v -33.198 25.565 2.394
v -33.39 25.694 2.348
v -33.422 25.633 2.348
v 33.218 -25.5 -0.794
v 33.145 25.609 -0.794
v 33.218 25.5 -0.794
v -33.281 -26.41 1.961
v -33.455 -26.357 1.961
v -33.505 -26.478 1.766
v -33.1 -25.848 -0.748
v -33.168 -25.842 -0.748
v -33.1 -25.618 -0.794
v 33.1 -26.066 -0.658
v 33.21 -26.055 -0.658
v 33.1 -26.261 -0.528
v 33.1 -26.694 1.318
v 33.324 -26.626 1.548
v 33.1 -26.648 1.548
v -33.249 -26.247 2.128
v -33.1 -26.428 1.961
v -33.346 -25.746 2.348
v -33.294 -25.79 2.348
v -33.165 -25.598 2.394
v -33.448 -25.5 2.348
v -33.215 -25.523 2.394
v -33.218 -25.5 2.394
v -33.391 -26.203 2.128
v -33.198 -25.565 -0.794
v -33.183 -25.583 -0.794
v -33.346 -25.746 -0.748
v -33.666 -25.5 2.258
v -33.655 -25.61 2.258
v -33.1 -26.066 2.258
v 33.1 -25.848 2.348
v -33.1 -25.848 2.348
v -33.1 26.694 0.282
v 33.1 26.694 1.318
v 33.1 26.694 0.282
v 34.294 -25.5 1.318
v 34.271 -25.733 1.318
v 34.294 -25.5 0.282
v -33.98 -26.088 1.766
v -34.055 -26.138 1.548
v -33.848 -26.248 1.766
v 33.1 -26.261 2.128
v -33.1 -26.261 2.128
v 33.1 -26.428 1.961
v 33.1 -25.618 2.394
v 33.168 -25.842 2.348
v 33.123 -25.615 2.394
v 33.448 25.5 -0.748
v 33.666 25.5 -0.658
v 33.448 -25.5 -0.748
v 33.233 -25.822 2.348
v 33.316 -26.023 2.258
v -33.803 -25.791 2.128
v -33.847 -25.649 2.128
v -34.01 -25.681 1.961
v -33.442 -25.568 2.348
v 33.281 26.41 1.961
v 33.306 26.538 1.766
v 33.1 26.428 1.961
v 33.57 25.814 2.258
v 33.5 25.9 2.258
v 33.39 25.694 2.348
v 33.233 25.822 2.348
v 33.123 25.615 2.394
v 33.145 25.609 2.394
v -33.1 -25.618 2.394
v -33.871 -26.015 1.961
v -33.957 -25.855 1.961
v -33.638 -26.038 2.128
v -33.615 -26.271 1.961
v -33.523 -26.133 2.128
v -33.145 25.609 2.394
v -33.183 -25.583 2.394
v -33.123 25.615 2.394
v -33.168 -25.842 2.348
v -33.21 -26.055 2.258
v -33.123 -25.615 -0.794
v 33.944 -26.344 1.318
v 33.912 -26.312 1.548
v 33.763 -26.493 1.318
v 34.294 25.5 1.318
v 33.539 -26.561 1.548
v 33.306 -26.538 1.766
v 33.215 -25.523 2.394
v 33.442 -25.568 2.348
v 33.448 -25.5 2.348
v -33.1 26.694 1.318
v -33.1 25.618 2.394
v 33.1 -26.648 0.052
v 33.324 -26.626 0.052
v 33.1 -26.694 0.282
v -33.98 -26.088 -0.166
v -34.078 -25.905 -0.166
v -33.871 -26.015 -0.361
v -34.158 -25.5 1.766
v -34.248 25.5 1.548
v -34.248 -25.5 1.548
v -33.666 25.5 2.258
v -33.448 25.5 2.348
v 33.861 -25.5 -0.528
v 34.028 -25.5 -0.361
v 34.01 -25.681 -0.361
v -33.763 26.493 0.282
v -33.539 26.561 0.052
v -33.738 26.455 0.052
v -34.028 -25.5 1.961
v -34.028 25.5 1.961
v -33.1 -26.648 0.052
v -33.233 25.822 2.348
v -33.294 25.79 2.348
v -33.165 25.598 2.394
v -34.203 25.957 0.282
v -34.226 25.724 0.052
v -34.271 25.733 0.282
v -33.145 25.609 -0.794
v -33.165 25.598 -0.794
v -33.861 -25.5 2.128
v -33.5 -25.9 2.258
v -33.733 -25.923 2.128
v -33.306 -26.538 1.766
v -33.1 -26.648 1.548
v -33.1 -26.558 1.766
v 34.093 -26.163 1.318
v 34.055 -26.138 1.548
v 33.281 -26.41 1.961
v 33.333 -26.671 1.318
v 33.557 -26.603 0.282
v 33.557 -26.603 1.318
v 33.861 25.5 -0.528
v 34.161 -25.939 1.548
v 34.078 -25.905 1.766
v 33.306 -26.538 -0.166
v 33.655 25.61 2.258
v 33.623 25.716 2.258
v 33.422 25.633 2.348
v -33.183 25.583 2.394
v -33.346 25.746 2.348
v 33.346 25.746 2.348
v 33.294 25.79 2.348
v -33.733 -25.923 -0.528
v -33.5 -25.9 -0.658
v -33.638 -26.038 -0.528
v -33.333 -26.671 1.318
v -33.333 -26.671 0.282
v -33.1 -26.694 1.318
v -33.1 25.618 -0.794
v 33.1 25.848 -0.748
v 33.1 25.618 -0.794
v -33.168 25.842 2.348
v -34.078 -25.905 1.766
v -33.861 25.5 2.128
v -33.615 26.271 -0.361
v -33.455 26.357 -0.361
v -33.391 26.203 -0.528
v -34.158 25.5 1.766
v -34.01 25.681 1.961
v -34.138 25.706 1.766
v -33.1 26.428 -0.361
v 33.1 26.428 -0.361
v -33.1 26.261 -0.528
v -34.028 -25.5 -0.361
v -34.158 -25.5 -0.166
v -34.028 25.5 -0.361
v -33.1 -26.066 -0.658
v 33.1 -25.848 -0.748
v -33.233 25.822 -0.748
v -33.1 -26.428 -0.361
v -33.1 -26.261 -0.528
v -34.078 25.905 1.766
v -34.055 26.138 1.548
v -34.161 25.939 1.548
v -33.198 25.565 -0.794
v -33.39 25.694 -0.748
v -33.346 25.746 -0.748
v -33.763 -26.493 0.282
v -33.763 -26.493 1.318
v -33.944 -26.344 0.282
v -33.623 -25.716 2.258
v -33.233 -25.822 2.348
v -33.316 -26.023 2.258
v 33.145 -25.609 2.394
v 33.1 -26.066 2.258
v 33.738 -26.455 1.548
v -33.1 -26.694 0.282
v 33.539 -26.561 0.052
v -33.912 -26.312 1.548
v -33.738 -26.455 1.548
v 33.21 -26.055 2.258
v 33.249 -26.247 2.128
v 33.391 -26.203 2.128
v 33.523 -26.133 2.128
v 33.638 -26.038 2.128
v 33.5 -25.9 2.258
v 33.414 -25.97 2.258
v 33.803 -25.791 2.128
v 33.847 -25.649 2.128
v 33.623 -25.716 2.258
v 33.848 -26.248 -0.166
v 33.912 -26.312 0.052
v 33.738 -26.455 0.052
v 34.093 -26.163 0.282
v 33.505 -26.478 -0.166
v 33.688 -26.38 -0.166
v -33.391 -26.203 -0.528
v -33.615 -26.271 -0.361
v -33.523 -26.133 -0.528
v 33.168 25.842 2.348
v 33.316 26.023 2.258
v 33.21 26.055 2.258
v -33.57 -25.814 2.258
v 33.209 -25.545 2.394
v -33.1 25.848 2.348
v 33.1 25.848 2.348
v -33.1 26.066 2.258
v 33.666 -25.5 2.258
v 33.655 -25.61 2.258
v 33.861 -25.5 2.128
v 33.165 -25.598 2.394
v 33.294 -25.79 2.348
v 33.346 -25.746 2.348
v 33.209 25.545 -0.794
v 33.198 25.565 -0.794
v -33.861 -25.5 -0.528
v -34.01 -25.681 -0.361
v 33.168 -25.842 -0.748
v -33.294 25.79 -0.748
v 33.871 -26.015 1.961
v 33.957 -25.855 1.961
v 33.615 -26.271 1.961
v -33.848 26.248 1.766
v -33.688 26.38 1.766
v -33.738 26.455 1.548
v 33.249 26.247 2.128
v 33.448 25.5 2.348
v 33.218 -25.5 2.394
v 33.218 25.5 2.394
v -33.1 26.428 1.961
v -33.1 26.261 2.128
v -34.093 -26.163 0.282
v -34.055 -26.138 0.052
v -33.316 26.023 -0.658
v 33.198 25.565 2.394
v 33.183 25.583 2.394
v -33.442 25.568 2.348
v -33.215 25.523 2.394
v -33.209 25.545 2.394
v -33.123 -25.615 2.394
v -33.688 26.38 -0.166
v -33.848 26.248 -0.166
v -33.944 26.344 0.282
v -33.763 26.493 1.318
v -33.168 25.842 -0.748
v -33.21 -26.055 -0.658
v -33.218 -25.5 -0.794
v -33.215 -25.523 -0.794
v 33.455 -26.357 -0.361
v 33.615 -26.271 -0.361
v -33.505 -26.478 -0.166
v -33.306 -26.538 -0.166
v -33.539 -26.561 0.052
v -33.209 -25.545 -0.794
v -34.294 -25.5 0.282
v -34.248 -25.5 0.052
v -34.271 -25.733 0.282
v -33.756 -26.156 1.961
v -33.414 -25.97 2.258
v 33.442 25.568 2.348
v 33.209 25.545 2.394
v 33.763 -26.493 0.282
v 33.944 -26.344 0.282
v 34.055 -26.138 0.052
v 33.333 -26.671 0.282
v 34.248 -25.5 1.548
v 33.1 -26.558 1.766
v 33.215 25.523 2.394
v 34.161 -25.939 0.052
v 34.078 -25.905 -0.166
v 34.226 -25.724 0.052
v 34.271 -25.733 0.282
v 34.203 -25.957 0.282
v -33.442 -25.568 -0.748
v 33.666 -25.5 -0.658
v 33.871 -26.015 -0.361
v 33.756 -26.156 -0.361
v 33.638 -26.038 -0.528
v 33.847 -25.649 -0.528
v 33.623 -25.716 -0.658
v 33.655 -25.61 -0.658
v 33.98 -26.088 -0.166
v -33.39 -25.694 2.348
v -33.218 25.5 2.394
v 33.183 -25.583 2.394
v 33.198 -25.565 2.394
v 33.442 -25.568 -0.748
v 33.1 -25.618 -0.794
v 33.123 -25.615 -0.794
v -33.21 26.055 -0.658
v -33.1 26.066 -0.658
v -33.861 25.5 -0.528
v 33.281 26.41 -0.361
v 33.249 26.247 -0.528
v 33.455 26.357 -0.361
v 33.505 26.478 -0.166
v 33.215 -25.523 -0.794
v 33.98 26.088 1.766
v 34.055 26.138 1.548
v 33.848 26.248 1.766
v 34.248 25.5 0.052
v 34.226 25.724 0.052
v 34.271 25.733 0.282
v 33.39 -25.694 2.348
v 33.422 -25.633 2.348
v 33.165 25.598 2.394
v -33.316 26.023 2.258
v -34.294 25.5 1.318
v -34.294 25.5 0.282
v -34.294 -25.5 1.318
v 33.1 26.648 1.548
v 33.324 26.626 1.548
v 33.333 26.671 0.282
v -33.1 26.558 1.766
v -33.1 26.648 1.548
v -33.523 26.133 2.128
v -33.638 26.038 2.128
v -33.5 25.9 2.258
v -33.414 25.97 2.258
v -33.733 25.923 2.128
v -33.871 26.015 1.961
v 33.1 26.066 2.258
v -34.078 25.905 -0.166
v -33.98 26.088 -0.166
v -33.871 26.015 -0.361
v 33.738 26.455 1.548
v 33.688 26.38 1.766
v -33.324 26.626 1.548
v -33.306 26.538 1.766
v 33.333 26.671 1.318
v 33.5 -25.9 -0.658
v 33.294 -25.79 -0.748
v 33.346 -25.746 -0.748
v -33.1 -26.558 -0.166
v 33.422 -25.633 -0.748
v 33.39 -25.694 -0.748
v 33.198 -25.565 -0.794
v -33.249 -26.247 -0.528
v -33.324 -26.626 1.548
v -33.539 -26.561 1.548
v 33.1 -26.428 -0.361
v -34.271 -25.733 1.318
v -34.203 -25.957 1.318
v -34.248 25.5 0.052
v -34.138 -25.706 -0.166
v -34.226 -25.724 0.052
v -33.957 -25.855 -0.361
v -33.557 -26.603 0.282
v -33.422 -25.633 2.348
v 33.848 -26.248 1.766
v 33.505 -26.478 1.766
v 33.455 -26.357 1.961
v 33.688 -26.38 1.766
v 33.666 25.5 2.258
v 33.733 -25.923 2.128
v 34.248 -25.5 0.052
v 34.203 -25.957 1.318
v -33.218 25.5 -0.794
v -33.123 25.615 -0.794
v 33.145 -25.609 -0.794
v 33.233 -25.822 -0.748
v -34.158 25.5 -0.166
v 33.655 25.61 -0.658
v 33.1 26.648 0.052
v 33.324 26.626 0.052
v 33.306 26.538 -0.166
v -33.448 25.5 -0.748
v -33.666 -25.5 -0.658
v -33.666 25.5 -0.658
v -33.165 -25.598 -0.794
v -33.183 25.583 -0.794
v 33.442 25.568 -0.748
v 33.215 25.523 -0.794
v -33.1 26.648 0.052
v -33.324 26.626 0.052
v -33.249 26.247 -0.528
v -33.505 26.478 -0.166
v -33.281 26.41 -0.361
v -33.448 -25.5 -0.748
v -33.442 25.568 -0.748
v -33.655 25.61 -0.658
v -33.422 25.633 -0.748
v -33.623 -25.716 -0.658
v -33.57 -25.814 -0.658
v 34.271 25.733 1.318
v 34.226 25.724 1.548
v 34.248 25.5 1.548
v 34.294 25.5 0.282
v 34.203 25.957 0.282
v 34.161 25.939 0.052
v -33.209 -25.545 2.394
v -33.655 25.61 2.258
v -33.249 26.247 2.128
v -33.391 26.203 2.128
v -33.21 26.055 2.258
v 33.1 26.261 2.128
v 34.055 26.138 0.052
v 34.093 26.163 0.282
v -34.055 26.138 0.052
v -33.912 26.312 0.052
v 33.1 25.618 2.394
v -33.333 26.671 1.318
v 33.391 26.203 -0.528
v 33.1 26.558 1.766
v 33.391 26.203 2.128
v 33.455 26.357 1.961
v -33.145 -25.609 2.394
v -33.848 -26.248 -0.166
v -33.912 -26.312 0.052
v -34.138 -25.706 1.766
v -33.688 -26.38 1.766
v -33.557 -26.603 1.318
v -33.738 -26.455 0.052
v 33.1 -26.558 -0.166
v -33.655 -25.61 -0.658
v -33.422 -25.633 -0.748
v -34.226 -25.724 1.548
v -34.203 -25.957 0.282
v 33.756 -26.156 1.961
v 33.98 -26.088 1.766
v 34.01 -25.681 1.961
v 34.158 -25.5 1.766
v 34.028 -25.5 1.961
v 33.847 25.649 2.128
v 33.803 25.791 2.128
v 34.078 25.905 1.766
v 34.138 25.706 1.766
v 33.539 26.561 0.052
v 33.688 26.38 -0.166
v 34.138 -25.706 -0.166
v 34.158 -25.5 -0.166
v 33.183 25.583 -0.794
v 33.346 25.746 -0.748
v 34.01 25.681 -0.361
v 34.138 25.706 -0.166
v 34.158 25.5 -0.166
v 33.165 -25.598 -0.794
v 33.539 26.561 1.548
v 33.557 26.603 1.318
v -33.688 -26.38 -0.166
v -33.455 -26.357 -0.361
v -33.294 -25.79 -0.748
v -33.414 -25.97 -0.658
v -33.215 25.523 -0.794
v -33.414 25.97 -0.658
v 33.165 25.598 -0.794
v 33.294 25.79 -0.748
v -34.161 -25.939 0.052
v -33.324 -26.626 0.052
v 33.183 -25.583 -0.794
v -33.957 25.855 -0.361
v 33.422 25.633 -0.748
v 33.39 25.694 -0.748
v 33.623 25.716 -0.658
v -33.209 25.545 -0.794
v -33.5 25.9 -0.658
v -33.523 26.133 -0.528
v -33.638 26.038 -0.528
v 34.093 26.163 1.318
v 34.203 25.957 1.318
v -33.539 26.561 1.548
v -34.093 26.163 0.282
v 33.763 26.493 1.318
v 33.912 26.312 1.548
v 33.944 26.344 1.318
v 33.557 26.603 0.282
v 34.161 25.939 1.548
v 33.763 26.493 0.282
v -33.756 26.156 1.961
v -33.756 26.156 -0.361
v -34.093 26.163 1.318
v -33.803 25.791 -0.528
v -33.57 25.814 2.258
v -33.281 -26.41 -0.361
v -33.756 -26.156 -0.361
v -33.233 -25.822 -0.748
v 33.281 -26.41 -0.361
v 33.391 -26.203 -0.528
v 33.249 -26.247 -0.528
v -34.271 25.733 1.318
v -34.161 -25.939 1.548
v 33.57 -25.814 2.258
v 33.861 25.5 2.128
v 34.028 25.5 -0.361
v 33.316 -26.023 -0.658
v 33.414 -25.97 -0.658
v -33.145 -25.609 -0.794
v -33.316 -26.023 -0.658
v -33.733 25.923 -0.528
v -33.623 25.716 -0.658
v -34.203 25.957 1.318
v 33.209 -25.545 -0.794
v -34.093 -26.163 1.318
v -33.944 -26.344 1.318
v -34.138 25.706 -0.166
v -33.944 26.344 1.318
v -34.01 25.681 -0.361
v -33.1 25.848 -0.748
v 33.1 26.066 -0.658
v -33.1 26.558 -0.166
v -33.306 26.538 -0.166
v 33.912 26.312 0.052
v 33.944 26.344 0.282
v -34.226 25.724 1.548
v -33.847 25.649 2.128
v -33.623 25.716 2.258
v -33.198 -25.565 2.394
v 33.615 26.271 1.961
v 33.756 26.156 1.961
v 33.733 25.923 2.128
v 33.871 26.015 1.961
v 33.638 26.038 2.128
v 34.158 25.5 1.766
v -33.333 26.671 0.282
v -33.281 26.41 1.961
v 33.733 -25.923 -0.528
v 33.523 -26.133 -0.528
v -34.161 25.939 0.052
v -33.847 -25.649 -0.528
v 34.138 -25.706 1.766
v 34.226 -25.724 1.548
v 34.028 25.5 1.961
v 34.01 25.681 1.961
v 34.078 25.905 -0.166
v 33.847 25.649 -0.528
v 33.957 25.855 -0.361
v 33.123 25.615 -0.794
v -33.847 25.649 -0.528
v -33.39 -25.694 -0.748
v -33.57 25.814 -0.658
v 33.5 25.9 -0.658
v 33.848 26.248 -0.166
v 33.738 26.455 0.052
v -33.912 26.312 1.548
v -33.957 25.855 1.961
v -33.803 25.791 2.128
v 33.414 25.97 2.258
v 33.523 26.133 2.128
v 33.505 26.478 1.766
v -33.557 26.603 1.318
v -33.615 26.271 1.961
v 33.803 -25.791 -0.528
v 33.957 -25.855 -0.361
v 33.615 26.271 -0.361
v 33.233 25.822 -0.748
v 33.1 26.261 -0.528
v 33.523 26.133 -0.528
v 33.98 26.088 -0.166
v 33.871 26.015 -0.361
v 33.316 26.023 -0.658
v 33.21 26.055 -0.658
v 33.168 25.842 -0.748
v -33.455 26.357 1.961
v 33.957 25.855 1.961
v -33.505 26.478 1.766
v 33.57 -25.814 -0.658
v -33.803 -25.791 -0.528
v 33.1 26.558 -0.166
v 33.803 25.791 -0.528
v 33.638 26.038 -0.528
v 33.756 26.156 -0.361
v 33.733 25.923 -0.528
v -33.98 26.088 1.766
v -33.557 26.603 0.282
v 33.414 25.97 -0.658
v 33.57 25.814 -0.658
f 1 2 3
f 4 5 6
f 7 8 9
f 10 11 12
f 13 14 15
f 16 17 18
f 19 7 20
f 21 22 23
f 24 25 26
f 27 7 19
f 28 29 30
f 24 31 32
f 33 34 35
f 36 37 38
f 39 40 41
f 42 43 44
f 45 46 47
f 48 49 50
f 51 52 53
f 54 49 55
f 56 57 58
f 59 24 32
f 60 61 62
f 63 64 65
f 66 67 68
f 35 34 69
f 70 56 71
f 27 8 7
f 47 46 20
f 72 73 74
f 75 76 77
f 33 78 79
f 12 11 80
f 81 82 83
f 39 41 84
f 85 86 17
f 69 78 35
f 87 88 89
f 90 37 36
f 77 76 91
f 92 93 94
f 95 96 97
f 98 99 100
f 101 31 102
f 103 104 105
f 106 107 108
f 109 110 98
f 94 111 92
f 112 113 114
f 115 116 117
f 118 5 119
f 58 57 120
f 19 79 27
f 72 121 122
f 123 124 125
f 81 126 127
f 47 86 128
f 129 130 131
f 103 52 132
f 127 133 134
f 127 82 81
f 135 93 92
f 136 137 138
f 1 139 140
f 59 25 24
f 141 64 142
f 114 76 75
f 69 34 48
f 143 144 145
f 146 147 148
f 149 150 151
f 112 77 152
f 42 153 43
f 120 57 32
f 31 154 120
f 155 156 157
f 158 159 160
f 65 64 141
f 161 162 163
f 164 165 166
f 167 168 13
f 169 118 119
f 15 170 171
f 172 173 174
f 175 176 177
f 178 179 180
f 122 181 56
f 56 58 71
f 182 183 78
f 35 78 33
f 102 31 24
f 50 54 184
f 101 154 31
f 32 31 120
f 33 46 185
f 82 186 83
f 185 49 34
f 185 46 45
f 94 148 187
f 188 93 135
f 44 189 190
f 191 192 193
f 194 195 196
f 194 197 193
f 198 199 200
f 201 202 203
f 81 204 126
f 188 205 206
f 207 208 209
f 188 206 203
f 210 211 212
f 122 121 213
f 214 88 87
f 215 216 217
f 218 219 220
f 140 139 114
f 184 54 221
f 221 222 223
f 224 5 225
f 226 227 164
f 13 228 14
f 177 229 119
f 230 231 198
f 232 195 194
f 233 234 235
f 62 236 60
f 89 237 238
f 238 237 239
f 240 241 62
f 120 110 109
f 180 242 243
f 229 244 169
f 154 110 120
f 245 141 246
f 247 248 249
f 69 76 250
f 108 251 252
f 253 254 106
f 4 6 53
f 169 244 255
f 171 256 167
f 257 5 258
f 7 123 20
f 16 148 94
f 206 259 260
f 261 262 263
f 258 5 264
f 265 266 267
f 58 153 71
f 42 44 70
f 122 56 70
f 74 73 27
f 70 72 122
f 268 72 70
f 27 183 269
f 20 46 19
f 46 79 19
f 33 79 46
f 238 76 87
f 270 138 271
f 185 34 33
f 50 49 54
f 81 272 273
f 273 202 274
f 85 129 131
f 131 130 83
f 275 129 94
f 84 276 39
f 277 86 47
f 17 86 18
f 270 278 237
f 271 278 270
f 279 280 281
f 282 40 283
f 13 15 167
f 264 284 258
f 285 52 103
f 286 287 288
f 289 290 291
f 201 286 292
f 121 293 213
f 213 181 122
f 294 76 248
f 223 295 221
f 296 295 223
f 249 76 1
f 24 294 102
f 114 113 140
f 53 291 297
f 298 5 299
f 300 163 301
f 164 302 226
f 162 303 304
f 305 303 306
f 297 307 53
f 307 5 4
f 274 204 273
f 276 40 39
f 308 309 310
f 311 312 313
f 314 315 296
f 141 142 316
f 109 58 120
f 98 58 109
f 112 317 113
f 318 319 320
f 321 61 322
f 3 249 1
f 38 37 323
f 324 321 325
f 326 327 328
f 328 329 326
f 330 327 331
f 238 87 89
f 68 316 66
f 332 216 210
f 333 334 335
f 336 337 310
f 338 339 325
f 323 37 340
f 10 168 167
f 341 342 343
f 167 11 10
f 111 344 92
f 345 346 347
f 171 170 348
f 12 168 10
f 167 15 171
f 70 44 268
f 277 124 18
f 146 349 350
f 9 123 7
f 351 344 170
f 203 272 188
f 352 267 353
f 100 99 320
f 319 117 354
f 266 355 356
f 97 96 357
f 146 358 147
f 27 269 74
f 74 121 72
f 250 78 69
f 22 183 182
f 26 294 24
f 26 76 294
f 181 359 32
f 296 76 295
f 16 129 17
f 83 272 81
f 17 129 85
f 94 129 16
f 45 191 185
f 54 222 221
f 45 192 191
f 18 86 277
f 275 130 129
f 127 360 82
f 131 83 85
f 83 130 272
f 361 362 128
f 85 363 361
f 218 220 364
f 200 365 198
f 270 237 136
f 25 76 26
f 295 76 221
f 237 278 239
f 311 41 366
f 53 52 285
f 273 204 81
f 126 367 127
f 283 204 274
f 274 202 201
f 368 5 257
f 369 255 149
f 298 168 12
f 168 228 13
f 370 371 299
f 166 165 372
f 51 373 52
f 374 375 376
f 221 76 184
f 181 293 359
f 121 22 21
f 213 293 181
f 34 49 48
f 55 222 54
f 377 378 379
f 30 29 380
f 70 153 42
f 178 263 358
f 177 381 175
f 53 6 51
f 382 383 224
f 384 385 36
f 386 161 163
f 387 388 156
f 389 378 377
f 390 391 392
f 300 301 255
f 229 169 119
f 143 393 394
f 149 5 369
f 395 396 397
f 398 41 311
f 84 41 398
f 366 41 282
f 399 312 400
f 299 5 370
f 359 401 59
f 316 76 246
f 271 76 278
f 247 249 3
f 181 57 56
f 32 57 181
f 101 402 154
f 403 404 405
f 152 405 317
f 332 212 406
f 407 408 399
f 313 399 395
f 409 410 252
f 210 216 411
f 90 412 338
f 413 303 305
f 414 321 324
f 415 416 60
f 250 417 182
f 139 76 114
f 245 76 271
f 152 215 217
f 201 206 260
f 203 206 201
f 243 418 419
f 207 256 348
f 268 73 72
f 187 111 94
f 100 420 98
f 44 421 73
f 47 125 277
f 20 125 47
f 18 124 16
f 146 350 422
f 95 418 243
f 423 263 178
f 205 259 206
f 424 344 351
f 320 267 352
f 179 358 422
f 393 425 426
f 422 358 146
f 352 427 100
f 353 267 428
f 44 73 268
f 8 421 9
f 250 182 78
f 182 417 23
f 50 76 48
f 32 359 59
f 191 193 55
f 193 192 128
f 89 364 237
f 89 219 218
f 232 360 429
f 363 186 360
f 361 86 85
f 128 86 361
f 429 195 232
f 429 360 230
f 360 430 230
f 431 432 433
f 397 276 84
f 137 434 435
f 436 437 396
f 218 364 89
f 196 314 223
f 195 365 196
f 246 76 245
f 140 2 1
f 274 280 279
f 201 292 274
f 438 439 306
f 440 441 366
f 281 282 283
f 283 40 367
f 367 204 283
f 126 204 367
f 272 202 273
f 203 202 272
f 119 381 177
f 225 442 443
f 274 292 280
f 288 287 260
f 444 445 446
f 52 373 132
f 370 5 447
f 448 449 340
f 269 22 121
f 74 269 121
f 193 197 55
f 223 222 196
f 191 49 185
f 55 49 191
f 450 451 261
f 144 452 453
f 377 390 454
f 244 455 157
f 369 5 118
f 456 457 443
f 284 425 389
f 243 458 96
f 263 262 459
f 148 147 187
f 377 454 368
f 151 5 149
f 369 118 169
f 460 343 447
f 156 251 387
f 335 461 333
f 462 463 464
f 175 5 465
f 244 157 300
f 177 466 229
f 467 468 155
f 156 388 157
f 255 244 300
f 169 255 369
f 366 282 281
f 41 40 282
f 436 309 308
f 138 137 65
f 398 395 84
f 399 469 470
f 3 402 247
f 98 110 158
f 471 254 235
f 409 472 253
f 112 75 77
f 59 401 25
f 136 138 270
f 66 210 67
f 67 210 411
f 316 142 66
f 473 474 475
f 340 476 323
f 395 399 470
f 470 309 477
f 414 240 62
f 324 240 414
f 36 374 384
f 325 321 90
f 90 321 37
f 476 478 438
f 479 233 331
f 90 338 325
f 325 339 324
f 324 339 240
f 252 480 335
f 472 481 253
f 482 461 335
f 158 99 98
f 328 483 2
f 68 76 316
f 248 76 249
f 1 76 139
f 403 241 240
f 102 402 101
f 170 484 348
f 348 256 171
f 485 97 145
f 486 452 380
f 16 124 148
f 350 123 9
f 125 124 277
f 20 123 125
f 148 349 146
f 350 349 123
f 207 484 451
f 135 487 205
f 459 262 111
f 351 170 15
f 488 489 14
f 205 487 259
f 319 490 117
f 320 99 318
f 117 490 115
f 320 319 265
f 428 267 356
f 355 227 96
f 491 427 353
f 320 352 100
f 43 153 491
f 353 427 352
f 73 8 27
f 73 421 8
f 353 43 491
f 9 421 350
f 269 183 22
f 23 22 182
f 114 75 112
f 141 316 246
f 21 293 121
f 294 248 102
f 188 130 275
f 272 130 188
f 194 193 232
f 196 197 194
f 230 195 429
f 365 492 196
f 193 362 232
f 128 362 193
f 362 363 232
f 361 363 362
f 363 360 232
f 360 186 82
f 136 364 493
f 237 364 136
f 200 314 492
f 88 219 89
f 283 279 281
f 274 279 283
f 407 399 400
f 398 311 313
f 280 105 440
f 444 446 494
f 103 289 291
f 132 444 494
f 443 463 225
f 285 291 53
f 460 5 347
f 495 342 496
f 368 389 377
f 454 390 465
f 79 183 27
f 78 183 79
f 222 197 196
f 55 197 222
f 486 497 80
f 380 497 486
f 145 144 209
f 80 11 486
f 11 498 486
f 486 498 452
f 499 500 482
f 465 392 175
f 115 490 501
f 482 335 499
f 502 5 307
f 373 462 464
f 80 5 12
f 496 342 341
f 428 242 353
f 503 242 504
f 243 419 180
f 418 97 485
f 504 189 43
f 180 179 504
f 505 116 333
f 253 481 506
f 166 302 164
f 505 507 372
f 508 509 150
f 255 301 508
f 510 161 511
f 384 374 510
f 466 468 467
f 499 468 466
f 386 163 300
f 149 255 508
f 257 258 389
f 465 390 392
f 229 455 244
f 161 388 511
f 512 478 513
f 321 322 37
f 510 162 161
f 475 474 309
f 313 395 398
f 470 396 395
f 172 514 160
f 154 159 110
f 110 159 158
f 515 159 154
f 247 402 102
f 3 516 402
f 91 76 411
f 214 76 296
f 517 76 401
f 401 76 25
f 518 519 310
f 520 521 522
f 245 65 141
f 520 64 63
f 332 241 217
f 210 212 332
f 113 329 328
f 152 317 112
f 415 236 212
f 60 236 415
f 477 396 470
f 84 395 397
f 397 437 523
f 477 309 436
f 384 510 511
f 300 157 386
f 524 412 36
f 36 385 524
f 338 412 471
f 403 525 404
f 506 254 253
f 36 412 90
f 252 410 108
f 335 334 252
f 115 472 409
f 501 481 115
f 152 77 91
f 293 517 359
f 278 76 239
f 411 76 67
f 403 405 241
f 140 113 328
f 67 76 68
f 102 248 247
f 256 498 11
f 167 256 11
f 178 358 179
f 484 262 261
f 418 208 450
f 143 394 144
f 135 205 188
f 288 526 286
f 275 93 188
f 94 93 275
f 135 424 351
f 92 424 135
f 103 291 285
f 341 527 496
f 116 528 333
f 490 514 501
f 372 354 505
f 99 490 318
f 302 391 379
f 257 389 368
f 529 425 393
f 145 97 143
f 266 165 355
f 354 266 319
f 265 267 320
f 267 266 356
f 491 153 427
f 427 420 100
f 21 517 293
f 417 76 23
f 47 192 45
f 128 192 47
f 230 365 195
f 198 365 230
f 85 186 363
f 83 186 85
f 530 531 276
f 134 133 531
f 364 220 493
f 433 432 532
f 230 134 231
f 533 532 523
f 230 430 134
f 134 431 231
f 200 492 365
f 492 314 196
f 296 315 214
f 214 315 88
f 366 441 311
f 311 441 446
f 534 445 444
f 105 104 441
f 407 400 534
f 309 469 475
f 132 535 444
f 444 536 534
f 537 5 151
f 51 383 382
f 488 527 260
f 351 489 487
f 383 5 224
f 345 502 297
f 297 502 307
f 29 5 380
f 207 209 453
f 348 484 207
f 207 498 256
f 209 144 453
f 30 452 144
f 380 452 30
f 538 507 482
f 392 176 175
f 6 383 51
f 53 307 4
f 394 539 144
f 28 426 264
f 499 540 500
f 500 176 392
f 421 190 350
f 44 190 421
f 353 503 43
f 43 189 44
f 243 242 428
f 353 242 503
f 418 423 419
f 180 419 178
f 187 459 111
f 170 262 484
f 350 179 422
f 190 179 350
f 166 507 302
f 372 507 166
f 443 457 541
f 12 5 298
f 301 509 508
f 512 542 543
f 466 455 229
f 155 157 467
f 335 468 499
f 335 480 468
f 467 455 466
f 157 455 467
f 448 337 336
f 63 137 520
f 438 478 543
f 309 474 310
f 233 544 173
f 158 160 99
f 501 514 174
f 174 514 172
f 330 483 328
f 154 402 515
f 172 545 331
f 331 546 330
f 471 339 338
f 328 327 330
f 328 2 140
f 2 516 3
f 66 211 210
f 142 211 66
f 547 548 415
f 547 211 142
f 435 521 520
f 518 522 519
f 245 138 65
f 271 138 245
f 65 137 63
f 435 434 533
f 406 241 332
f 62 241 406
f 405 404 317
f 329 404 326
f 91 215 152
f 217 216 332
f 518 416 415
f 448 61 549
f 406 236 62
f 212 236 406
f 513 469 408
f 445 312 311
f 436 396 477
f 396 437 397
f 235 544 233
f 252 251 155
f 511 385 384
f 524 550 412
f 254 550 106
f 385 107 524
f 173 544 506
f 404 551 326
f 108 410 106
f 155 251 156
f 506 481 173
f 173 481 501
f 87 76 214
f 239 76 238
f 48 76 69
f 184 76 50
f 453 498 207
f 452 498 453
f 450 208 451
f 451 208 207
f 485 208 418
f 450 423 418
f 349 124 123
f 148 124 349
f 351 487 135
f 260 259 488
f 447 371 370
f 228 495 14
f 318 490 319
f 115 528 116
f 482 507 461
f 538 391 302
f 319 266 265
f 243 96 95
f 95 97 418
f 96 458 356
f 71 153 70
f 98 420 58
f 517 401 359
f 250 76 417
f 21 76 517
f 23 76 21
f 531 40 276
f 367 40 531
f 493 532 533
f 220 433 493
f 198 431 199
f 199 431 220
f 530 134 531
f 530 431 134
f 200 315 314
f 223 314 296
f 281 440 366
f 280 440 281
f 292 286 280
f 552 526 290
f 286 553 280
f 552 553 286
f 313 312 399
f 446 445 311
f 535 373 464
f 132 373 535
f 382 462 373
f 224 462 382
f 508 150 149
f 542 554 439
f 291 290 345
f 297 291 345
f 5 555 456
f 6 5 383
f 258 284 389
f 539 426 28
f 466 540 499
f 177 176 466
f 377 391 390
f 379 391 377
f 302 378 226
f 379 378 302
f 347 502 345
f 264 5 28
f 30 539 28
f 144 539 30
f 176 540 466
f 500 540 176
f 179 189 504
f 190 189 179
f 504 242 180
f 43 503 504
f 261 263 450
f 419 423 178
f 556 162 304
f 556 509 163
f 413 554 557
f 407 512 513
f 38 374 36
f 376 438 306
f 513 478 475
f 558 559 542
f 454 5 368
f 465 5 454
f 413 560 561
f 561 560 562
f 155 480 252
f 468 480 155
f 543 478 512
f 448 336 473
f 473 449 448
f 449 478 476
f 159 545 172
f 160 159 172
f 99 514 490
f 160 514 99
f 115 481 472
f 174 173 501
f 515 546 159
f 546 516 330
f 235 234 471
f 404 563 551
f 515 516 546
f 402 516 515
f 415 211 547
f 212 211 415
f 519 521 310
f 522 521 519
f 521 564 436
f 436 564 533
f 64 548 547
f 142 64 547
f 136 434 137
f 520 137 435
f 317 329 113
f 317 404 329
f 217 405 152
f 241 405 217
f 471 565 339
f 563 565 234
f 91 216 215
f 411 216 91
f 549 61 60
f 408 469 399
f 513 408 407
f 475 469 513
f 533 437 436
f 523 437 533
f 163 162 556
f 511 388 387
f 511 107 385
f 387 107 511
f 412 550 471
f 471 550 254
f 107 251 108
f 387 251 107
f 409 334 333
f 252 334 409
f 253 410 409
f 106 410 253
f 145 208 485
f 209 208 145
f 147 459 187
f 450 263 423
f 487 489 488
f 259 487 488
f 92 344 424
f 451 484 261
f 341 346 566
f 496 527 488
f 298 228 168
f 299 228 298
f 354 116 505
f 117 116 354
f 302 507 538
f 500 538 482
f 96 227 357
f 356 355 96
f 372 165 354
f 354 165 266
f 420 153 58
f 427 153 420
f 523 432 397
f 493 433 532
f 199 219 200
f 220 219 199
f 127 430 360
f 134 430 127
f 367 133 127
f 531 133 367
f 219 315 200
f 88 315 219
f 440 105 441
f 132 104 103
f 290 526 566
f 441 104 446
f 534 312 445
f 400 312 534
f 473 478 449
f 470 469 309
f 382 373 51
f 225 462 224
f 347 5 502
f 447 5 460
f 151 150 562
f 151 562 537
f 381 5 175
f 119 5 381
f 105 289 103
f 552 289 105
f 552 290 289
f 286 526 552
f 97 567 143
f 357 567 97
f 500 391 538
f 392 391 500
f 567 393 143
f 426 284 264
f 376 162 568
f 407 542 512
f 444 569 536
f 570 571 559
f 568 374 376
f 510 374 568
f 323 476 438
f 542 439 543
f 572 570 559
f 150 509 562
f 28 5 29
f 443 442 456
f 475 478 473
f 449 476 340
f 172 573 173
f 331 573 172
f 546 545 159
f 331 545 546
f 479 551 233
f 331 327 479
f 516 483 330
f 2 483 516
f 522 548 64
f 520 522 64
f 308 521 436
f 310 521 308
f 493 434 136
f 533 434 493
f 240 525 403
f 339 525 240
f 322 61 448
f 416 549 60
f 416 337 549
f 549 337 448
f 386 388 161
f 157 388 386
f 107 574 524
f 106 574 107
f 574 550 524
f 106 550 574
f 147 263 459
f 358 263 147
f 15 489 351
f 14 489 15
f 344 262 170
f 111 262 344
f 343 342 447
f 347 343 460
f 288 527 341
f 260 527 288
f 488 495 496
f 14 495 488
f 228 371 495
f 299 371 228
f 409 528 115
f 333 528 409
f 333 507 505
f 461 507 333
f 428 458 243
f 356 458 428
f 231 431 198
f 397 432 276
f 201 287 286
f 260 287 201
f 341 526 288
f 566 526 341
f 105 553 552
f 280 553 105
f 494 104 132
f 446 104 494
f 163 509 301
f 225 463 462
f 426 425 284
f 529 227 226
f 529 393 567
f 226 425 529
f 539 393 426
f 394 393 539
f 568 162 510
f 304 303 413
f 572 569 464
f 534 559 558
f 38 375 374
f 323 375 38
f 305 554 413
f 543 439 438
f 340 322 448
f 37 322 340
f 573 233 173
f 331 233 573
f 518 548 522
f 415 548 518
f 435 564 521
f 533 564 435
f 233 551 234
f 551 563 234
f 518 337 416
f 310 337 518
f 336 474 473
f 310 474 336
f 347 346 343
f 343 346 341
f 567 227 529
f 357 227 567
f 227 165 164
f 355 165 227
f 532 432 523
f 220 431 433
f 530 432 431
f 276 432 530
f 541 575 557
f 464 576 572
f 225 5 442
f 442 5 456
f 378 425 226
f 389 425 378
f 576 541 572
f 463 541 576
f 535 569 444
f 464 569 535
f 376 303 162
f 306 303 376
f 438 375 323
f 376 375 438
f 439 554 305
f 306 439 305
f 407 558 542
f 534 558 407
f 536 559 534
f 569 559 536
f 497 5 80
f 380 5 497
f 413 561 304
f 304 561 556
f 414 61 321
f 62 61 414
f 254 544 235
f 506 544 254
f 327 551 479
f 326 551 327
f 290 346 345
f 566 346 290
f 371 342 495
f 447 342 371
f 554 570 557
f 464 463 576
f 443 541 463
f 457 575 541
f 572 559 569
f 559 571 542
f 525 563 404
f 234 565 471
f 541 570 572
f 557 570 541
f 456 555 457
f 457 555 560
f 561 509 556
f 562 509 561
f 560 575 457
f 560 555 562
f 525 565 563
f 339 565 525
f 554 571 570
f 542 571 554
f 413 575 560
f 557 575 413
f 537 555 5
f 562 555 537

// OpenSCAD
// Arduino Uno R3 (Arduino Uno R3) visual source for NexCAD.
// Units: millimeters. Origin: part bottom-center, matching src/parts/library.ts.
// This generated baseline is intentionally simple; refine it with measured details before exporting STL.

$fn = 32;

module rounded_box(size, r = 0.8) {
  hull() {
    for (x = [-size[0] / 2 + r, size[0] / 2 - r])
      for (y = [-size[1] / 2 + r, size[1] / 2 - r]) {
        translate([x, y, r]) sphere(r = r);
        translate([x, y, size[2] - r]) sphere(r = r);
      }
  }
}

color("#2e7d5b") rounded_box([68.6, 53.4, 1.6], min(1.2, min(68.6, 53.4) / 8));
